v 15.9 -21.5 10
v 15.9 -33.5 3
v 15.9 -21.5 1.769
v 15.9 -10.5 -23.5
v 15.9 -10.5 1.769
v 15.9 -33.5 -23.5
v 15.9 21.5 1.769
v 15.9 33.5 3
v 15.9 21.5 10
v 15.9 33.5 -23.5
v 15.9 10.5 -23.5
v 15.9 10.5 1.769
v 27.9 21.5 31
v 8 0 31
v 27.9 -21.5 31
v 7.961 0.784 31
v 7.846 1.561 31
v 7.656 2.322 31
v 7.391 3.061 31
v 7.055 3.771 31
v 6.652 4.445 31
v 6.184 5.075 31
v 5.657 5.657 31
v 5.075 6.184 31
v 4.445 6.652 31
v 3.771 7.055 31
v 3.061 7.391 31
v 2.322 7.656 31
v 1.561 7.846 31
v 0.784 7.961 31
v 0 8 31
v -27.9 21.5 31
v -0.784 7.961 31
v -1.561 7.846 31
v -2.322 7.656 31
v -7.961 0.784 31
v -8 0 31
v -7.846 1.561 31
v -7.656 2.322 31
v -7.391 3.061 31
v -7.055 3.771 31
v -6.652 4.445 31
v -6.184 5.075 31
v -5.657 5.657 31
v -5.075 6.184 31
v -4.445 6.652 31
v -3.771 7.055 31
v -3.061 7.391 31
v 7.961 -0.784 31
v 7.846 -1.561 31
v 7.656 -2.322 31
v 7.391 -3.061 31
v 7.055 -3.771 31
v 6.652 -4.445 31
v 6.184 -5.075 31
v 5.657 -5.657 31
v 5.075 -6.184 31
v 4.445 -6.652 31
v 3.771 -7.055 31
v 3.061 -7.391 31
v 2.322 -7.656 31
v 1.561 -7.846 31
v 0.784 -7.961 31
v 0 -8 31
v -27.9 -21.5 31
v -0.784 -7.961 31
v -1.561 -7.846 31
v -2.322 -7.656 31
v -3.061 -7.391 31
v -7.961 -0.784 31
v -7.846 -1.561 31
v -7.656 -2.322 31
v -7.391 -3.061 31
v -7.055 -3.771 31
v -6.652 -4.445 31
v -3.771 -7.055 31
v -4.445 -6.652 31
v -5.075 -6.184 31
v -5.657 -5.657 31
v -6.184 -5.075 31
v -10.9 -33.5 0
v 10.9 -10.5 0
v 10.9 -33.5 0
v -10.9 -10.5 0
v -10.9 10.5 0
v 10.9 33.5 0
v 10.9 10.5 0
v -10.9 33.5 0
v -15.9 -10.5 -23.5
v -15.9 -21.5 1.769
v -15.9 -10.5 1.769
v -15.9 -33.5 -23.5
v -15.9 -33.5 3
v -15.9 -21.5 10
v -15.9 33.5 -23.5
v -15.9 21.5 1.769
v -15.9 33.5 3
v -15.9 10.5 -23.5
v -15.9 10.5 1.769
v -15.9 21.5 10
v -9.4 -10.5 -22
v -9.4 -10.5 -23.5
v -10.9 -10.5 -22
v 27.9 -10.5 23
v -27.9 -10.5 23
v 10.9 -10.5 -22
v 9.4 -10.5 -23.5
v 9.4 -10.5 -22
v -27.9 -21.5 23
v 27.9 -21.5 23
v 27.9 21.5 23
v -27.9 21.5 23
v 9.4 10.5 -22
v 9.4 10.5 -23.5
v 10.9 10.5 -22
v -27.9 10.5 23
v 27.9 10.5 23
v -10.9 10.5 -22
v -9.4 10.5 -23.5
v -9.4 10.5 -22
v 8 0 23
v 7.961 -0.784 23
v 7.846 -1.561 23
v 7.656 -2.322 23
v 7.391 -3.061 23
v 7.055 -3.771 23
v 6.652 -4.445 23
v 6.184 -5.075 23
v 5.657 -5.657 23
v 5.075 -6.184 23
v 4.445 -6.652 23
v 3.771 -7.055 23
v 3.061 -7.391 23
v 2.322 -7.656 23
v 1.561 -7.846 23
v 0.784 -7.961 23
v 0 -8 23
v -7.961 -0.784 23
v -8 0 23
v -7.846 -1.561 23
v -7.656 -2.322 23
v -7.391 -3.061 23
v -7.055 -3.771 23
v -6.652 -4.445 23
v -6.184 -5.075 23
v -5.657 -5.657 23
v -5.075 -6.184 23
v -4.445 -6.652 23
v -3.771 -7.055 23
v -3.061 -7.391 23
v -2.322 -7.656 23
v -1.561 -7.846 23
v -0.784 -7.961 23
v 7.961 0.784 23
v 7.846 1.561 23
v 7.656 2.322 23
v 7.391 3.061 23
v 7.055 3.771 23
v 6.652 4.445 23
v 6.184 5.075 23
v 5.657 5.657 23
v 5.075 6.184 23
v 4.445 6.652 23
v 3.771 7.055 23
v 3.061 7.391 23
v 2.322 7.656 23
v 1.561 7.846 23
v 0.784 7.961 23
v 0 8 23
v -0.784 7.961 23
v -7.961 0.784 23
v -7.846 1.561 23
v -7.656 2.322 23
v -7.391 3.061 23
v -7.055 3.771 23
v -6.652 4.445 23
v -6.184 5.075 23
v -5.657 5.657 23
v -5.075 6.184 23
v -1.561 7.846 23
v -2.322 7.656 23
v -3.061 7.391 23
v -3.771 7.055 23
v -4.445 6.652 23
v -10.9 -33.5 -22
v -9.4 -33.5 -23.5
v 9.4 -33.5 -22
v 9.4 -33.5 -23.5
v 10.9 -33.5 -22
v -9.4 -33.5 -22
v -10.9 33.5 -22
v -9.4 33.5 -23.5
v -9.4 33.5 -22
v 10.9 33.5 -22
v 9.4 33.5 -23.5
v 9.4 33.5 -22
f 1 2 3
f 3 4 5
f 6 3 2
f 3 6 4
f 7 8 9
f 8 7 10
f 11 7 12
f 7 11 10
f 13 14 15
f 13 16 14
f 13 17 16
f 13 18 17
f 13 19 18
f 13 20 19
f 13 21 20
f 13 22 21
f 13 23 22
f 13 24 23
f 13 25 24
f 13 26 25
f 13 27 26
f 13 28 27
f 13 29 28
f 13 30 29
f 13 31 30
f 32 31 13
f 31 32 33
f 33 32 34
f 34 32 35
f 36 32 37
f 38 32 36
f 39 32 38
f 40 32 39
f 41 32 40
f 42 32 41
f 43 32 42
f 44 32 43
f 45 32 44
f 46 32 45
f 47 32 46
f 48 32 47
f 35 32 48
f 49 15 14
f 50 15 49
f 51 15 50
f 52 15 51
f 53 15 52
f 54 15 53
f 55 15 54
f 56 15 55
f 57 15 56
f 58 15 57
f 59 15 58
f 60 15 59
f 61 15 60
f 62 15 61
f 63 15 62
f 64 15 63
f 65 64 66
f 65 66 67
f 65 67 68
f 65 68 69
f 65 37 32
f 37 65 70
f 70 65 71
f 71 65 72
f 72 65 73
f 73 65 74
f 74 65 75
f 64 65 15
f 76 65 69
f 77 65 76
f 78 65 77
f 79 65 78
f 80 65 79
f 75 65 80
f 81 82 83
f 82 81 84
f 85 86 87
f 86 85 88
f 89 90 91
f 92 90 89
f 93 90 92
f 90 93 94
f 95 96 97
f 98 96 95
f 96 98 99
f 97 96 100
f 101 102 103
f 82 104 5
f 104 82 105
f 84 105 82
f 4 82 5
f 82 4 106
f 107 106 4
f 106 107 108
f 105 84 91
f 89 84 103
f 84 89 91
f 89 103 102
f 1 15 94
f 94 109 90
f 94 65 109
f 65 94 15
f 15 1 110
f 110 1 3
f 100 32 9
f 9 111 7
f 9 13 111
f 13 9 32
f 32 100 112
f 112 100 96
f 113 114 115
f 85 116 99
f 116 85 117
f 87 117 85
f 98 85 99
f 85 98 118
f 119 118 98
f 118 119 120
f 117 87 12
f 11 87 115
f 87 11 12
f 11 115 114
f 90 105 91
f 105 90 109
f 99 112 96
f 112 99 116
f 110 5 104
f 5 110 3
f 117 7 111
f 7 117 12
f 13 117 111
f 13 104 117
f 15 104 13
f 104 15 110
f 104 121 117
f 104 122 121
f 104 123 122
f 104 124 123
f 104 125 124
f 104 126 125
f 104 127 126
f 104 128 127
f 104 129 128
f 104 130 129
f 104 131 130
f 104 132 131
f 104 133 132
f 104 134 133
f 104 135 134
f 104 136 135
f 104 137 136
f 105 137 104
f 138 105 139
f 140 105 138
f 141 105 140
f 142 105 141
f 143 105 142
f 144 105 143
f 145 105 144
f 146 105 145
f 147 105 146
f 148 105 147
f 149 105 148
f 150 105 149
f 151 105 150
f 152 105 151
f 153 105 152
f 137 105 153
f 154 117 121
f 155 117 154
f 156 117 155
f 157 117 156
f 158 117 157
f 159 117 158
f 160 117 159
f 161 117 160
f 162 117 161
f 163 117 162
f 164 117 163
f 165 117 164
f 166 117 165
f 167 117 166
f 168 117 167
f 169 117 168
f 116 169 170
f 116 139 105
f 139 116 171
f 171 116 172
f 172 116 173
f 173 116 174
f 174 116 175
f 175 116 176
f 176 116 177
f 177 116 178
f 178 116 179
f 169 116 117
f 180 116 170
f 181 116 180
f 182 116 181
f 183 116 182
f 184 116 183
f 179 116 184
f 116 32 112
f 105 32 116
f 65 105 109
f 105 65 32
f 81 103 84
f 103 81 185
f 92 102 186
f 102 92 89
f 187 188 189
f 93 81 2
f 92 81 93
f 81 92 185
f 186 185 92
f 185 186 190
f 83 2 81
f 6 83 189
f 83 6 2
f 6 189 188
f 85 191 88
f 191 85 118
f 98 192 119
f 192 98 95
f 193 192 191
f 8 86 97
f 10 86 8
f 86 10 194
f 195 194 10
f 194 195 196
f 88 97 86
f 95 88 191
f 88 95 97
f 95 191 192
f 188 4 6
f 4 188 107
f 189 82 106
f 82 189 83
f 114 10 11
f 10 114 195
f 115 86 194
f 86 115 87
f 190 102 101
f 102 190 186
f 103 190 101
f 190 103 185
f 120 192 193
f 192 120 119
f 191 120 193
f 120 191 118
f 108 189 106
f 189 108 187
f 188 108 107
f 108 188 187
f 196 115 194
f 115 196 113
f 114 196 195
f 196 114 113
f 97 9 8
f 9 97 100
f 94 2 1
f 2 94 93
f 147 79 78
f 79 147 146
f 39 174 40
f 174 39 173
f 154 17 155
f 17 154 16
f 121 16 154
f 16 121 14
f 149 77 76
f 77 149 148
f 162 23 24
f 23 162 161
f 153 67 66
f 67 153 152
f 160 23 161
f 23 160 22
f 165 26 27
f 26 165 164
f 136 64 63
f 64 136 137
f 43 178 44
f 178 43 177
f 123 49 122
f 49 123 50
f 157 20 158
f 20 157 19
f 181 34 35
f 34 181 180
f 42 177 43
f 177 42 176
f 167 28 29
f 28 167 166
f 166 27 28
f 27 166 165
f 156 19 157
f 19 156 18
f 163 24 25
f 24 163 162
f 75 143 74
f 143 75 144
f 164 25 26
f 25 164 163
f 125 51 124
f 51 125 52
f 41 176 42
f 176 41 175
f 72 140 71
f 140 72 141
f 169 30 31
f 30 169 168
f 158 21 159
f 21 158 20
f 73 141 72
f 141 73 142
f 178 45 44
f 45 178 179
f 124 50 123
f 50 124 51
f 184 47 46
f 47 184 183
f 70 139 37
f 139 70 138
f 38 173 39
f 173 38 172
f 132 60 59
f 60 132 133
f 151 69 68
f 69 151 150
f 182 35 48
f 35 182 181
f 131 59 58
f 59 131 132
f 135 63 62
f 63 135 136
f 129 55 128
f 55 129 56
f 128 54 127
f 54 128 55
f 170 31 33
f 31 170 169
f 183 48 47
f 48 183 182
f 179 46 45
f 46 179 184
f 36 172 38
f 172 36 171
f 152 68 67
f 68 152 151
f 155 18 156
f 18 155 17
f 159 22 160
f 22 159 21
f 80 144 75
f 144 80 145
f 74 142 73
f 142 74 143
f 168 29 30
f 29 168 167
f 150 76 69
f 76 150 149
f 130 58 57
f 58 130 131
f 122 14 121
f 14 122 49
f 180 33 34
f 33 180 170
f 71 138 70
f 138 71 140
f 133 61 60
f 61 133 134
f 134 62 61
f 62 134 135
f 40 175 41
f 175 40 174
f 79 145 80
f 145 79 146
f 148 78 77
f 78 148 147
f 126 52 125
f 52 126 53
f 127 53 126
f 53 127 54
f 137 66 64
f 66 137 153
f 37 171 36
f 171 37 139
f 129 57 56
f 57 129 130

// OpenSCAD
// file: ../perpendicular-u-joint-guard-v1.11-fit-21xy-22z/fit_clearance_guard.scad
// v1.11, mm. X=upper gray tube axis; Y=blue foot axis; Z=up.
// Resize mating envelopes, NOT a global scale: walls, eaves, bore and ramp
// heights keep their accepted sizes. Actual context tubes remain 20x20.
$fn=48;

module guard_v1_11(nx=21,ny=21,nz=22,feature="all") {
    wall=5;
    inner_x=nx+0.8; // Preserve the pre-existing PETG printing relief.
    outer_x=inner_x+2*wall;
    wall_x=inner_x/2+wall/2;
    inner_y=ny/2;
    root_y=inner_y+11;
    tip_y=root_y+12;
    roof_bottom=nz+1;
    roof_top=roof_bottom+8;
    roof_half_x=outer_x/2+12;
    bottom_z=-nz-1.5;
    // Keep the real 20 mm foot's 0.6 mm engagement rather than moving the
    // lip tip outward with nx (which would leave only 0.1 mm engagement).
    lip_tip_x=20/2-0.6;
    lip_depth=wall_x-lip_tip_x;

    assert(nx>=20 && ny>=20 && nz>=20);
    assert(lip_depth>0 && lip_depth<wall+inner_x/2);

    module upper_body() {
        for(s=[-1,1]) {
            // Solid XZ upper U web, down from the roof to blue top Z=0.
            translate([0,s*(inner_y+root_y)/2,roof_top/2])
                cube([outer_x,11,roof_top],center=true);
            translate([s*wall_x,0,roof_top/2])
                cube([wall,2*root_y,roof_top],center=true);
        }
        translate([0,0,roof_bottom+4])
            cube([2*roof_half_x,2*root_y,8],center=true);
        for(sx=[-1,1]) for(sy=[-1,1])
            translate([0,sy*(inner_y+root_y)/2,0])
                rotate([90,0,0]) linear_extrude(height=11,center=true)
                    polygon([
                        [sx*roof_half_x,roof_bottom],
                        [sx*(outer_x/2-1),roof_bottom+0.5],
                        [sx*(outer_x/2-1),0]
                    ]);
    }
    module hooks() {
        for(sx=[-1,1]) for(sy=[-1,1])
            translate([sx*(lip_tip_x+lip_depth/2),
                       sy*(inner_y+tip_y)/2,-nz-0.75])
                cube([lip_depth,tip_y-inner_y,1.5],center=true);
    }
    module lower_body() {
        for(sx=[-1,1]) for(sy=[-1,1])
            translate([sx*wall_x,sy*(inner_y+tip_y)/2,bottom_z/2])
                cube([wall,tip_y-inner_y,-bottom_z],center=true);
        hooks();
    }
    module positive_ramp() {
        rotate([90,0,90]) linear_extrude(height=outer_x,center=true)
            polygon([[root_y-0.2,0],[tip_y,0],[tip_y,3],
                     [root_y,10],[root_y-0.2,10]]);
    }
    module end_ramps() {
        positive_ramp(); mirror([0,1,0]) positive_ramp();
        for(sx=[-1,1]) for(sy=[-1,1])
            translate([sx*wall_x,sy*(root_y+tip_y)/2,0])
                cube([wall,12,0.4],center=true);
    }

    difference() {
        union() {
            if(feature=="all" || feature=="upper") upper_body();
            if(feature=="all" || feature=="lower") lower_body();
            if(feature=="all" || feature=="ramps") end_ramps();
            if(feature=="hooks") hooks();
        }
        // True, unstepped round nut passage through the ENTIRE final part.
        cylinder(d=16,h=160,center=true,$fn=64);
        // Bottom-open gray-tube entry, ny wide and nz high. This removes
        // upper rigid interference without deleting either XZ solid web.
        translate([-60,-ny/2,-60]) cube([120,ny,60+nz]);
    }
}

guard_v1_11();
// main file
// v1.12, mm. X=upper gray tube; Y=blue foot; Z=up.
// Only remove the two 5 x ny x 1 mm ribs below the roof over the gray tube.
// Keep v1.11 as an immutable dependency; no rescaling or other geometry edits.
use <../perpendicular-u-joint-guard-v1.11-fit-21xy-22z/fit_clearance_guard.scad>;

module guard_v1_12(nx=21,ny=21,nz=22,feature="all") {
    roof_bottom=nz+1; // Same accepted 8 mm roof: Z=23..31 at defaults.
    difference() {
        guard_v1_11(nx,ny,nz,feature);
        // The old entry stopped at nz, leaving the arms' last 1 mm intact.
        // Cut to the actual roof underside, not into the roof or XZ webs.
        translate([-60,-ny/2,-60]) cube([120,ny,60+roof_bottom]);
    }
}

guard_v1_12();
